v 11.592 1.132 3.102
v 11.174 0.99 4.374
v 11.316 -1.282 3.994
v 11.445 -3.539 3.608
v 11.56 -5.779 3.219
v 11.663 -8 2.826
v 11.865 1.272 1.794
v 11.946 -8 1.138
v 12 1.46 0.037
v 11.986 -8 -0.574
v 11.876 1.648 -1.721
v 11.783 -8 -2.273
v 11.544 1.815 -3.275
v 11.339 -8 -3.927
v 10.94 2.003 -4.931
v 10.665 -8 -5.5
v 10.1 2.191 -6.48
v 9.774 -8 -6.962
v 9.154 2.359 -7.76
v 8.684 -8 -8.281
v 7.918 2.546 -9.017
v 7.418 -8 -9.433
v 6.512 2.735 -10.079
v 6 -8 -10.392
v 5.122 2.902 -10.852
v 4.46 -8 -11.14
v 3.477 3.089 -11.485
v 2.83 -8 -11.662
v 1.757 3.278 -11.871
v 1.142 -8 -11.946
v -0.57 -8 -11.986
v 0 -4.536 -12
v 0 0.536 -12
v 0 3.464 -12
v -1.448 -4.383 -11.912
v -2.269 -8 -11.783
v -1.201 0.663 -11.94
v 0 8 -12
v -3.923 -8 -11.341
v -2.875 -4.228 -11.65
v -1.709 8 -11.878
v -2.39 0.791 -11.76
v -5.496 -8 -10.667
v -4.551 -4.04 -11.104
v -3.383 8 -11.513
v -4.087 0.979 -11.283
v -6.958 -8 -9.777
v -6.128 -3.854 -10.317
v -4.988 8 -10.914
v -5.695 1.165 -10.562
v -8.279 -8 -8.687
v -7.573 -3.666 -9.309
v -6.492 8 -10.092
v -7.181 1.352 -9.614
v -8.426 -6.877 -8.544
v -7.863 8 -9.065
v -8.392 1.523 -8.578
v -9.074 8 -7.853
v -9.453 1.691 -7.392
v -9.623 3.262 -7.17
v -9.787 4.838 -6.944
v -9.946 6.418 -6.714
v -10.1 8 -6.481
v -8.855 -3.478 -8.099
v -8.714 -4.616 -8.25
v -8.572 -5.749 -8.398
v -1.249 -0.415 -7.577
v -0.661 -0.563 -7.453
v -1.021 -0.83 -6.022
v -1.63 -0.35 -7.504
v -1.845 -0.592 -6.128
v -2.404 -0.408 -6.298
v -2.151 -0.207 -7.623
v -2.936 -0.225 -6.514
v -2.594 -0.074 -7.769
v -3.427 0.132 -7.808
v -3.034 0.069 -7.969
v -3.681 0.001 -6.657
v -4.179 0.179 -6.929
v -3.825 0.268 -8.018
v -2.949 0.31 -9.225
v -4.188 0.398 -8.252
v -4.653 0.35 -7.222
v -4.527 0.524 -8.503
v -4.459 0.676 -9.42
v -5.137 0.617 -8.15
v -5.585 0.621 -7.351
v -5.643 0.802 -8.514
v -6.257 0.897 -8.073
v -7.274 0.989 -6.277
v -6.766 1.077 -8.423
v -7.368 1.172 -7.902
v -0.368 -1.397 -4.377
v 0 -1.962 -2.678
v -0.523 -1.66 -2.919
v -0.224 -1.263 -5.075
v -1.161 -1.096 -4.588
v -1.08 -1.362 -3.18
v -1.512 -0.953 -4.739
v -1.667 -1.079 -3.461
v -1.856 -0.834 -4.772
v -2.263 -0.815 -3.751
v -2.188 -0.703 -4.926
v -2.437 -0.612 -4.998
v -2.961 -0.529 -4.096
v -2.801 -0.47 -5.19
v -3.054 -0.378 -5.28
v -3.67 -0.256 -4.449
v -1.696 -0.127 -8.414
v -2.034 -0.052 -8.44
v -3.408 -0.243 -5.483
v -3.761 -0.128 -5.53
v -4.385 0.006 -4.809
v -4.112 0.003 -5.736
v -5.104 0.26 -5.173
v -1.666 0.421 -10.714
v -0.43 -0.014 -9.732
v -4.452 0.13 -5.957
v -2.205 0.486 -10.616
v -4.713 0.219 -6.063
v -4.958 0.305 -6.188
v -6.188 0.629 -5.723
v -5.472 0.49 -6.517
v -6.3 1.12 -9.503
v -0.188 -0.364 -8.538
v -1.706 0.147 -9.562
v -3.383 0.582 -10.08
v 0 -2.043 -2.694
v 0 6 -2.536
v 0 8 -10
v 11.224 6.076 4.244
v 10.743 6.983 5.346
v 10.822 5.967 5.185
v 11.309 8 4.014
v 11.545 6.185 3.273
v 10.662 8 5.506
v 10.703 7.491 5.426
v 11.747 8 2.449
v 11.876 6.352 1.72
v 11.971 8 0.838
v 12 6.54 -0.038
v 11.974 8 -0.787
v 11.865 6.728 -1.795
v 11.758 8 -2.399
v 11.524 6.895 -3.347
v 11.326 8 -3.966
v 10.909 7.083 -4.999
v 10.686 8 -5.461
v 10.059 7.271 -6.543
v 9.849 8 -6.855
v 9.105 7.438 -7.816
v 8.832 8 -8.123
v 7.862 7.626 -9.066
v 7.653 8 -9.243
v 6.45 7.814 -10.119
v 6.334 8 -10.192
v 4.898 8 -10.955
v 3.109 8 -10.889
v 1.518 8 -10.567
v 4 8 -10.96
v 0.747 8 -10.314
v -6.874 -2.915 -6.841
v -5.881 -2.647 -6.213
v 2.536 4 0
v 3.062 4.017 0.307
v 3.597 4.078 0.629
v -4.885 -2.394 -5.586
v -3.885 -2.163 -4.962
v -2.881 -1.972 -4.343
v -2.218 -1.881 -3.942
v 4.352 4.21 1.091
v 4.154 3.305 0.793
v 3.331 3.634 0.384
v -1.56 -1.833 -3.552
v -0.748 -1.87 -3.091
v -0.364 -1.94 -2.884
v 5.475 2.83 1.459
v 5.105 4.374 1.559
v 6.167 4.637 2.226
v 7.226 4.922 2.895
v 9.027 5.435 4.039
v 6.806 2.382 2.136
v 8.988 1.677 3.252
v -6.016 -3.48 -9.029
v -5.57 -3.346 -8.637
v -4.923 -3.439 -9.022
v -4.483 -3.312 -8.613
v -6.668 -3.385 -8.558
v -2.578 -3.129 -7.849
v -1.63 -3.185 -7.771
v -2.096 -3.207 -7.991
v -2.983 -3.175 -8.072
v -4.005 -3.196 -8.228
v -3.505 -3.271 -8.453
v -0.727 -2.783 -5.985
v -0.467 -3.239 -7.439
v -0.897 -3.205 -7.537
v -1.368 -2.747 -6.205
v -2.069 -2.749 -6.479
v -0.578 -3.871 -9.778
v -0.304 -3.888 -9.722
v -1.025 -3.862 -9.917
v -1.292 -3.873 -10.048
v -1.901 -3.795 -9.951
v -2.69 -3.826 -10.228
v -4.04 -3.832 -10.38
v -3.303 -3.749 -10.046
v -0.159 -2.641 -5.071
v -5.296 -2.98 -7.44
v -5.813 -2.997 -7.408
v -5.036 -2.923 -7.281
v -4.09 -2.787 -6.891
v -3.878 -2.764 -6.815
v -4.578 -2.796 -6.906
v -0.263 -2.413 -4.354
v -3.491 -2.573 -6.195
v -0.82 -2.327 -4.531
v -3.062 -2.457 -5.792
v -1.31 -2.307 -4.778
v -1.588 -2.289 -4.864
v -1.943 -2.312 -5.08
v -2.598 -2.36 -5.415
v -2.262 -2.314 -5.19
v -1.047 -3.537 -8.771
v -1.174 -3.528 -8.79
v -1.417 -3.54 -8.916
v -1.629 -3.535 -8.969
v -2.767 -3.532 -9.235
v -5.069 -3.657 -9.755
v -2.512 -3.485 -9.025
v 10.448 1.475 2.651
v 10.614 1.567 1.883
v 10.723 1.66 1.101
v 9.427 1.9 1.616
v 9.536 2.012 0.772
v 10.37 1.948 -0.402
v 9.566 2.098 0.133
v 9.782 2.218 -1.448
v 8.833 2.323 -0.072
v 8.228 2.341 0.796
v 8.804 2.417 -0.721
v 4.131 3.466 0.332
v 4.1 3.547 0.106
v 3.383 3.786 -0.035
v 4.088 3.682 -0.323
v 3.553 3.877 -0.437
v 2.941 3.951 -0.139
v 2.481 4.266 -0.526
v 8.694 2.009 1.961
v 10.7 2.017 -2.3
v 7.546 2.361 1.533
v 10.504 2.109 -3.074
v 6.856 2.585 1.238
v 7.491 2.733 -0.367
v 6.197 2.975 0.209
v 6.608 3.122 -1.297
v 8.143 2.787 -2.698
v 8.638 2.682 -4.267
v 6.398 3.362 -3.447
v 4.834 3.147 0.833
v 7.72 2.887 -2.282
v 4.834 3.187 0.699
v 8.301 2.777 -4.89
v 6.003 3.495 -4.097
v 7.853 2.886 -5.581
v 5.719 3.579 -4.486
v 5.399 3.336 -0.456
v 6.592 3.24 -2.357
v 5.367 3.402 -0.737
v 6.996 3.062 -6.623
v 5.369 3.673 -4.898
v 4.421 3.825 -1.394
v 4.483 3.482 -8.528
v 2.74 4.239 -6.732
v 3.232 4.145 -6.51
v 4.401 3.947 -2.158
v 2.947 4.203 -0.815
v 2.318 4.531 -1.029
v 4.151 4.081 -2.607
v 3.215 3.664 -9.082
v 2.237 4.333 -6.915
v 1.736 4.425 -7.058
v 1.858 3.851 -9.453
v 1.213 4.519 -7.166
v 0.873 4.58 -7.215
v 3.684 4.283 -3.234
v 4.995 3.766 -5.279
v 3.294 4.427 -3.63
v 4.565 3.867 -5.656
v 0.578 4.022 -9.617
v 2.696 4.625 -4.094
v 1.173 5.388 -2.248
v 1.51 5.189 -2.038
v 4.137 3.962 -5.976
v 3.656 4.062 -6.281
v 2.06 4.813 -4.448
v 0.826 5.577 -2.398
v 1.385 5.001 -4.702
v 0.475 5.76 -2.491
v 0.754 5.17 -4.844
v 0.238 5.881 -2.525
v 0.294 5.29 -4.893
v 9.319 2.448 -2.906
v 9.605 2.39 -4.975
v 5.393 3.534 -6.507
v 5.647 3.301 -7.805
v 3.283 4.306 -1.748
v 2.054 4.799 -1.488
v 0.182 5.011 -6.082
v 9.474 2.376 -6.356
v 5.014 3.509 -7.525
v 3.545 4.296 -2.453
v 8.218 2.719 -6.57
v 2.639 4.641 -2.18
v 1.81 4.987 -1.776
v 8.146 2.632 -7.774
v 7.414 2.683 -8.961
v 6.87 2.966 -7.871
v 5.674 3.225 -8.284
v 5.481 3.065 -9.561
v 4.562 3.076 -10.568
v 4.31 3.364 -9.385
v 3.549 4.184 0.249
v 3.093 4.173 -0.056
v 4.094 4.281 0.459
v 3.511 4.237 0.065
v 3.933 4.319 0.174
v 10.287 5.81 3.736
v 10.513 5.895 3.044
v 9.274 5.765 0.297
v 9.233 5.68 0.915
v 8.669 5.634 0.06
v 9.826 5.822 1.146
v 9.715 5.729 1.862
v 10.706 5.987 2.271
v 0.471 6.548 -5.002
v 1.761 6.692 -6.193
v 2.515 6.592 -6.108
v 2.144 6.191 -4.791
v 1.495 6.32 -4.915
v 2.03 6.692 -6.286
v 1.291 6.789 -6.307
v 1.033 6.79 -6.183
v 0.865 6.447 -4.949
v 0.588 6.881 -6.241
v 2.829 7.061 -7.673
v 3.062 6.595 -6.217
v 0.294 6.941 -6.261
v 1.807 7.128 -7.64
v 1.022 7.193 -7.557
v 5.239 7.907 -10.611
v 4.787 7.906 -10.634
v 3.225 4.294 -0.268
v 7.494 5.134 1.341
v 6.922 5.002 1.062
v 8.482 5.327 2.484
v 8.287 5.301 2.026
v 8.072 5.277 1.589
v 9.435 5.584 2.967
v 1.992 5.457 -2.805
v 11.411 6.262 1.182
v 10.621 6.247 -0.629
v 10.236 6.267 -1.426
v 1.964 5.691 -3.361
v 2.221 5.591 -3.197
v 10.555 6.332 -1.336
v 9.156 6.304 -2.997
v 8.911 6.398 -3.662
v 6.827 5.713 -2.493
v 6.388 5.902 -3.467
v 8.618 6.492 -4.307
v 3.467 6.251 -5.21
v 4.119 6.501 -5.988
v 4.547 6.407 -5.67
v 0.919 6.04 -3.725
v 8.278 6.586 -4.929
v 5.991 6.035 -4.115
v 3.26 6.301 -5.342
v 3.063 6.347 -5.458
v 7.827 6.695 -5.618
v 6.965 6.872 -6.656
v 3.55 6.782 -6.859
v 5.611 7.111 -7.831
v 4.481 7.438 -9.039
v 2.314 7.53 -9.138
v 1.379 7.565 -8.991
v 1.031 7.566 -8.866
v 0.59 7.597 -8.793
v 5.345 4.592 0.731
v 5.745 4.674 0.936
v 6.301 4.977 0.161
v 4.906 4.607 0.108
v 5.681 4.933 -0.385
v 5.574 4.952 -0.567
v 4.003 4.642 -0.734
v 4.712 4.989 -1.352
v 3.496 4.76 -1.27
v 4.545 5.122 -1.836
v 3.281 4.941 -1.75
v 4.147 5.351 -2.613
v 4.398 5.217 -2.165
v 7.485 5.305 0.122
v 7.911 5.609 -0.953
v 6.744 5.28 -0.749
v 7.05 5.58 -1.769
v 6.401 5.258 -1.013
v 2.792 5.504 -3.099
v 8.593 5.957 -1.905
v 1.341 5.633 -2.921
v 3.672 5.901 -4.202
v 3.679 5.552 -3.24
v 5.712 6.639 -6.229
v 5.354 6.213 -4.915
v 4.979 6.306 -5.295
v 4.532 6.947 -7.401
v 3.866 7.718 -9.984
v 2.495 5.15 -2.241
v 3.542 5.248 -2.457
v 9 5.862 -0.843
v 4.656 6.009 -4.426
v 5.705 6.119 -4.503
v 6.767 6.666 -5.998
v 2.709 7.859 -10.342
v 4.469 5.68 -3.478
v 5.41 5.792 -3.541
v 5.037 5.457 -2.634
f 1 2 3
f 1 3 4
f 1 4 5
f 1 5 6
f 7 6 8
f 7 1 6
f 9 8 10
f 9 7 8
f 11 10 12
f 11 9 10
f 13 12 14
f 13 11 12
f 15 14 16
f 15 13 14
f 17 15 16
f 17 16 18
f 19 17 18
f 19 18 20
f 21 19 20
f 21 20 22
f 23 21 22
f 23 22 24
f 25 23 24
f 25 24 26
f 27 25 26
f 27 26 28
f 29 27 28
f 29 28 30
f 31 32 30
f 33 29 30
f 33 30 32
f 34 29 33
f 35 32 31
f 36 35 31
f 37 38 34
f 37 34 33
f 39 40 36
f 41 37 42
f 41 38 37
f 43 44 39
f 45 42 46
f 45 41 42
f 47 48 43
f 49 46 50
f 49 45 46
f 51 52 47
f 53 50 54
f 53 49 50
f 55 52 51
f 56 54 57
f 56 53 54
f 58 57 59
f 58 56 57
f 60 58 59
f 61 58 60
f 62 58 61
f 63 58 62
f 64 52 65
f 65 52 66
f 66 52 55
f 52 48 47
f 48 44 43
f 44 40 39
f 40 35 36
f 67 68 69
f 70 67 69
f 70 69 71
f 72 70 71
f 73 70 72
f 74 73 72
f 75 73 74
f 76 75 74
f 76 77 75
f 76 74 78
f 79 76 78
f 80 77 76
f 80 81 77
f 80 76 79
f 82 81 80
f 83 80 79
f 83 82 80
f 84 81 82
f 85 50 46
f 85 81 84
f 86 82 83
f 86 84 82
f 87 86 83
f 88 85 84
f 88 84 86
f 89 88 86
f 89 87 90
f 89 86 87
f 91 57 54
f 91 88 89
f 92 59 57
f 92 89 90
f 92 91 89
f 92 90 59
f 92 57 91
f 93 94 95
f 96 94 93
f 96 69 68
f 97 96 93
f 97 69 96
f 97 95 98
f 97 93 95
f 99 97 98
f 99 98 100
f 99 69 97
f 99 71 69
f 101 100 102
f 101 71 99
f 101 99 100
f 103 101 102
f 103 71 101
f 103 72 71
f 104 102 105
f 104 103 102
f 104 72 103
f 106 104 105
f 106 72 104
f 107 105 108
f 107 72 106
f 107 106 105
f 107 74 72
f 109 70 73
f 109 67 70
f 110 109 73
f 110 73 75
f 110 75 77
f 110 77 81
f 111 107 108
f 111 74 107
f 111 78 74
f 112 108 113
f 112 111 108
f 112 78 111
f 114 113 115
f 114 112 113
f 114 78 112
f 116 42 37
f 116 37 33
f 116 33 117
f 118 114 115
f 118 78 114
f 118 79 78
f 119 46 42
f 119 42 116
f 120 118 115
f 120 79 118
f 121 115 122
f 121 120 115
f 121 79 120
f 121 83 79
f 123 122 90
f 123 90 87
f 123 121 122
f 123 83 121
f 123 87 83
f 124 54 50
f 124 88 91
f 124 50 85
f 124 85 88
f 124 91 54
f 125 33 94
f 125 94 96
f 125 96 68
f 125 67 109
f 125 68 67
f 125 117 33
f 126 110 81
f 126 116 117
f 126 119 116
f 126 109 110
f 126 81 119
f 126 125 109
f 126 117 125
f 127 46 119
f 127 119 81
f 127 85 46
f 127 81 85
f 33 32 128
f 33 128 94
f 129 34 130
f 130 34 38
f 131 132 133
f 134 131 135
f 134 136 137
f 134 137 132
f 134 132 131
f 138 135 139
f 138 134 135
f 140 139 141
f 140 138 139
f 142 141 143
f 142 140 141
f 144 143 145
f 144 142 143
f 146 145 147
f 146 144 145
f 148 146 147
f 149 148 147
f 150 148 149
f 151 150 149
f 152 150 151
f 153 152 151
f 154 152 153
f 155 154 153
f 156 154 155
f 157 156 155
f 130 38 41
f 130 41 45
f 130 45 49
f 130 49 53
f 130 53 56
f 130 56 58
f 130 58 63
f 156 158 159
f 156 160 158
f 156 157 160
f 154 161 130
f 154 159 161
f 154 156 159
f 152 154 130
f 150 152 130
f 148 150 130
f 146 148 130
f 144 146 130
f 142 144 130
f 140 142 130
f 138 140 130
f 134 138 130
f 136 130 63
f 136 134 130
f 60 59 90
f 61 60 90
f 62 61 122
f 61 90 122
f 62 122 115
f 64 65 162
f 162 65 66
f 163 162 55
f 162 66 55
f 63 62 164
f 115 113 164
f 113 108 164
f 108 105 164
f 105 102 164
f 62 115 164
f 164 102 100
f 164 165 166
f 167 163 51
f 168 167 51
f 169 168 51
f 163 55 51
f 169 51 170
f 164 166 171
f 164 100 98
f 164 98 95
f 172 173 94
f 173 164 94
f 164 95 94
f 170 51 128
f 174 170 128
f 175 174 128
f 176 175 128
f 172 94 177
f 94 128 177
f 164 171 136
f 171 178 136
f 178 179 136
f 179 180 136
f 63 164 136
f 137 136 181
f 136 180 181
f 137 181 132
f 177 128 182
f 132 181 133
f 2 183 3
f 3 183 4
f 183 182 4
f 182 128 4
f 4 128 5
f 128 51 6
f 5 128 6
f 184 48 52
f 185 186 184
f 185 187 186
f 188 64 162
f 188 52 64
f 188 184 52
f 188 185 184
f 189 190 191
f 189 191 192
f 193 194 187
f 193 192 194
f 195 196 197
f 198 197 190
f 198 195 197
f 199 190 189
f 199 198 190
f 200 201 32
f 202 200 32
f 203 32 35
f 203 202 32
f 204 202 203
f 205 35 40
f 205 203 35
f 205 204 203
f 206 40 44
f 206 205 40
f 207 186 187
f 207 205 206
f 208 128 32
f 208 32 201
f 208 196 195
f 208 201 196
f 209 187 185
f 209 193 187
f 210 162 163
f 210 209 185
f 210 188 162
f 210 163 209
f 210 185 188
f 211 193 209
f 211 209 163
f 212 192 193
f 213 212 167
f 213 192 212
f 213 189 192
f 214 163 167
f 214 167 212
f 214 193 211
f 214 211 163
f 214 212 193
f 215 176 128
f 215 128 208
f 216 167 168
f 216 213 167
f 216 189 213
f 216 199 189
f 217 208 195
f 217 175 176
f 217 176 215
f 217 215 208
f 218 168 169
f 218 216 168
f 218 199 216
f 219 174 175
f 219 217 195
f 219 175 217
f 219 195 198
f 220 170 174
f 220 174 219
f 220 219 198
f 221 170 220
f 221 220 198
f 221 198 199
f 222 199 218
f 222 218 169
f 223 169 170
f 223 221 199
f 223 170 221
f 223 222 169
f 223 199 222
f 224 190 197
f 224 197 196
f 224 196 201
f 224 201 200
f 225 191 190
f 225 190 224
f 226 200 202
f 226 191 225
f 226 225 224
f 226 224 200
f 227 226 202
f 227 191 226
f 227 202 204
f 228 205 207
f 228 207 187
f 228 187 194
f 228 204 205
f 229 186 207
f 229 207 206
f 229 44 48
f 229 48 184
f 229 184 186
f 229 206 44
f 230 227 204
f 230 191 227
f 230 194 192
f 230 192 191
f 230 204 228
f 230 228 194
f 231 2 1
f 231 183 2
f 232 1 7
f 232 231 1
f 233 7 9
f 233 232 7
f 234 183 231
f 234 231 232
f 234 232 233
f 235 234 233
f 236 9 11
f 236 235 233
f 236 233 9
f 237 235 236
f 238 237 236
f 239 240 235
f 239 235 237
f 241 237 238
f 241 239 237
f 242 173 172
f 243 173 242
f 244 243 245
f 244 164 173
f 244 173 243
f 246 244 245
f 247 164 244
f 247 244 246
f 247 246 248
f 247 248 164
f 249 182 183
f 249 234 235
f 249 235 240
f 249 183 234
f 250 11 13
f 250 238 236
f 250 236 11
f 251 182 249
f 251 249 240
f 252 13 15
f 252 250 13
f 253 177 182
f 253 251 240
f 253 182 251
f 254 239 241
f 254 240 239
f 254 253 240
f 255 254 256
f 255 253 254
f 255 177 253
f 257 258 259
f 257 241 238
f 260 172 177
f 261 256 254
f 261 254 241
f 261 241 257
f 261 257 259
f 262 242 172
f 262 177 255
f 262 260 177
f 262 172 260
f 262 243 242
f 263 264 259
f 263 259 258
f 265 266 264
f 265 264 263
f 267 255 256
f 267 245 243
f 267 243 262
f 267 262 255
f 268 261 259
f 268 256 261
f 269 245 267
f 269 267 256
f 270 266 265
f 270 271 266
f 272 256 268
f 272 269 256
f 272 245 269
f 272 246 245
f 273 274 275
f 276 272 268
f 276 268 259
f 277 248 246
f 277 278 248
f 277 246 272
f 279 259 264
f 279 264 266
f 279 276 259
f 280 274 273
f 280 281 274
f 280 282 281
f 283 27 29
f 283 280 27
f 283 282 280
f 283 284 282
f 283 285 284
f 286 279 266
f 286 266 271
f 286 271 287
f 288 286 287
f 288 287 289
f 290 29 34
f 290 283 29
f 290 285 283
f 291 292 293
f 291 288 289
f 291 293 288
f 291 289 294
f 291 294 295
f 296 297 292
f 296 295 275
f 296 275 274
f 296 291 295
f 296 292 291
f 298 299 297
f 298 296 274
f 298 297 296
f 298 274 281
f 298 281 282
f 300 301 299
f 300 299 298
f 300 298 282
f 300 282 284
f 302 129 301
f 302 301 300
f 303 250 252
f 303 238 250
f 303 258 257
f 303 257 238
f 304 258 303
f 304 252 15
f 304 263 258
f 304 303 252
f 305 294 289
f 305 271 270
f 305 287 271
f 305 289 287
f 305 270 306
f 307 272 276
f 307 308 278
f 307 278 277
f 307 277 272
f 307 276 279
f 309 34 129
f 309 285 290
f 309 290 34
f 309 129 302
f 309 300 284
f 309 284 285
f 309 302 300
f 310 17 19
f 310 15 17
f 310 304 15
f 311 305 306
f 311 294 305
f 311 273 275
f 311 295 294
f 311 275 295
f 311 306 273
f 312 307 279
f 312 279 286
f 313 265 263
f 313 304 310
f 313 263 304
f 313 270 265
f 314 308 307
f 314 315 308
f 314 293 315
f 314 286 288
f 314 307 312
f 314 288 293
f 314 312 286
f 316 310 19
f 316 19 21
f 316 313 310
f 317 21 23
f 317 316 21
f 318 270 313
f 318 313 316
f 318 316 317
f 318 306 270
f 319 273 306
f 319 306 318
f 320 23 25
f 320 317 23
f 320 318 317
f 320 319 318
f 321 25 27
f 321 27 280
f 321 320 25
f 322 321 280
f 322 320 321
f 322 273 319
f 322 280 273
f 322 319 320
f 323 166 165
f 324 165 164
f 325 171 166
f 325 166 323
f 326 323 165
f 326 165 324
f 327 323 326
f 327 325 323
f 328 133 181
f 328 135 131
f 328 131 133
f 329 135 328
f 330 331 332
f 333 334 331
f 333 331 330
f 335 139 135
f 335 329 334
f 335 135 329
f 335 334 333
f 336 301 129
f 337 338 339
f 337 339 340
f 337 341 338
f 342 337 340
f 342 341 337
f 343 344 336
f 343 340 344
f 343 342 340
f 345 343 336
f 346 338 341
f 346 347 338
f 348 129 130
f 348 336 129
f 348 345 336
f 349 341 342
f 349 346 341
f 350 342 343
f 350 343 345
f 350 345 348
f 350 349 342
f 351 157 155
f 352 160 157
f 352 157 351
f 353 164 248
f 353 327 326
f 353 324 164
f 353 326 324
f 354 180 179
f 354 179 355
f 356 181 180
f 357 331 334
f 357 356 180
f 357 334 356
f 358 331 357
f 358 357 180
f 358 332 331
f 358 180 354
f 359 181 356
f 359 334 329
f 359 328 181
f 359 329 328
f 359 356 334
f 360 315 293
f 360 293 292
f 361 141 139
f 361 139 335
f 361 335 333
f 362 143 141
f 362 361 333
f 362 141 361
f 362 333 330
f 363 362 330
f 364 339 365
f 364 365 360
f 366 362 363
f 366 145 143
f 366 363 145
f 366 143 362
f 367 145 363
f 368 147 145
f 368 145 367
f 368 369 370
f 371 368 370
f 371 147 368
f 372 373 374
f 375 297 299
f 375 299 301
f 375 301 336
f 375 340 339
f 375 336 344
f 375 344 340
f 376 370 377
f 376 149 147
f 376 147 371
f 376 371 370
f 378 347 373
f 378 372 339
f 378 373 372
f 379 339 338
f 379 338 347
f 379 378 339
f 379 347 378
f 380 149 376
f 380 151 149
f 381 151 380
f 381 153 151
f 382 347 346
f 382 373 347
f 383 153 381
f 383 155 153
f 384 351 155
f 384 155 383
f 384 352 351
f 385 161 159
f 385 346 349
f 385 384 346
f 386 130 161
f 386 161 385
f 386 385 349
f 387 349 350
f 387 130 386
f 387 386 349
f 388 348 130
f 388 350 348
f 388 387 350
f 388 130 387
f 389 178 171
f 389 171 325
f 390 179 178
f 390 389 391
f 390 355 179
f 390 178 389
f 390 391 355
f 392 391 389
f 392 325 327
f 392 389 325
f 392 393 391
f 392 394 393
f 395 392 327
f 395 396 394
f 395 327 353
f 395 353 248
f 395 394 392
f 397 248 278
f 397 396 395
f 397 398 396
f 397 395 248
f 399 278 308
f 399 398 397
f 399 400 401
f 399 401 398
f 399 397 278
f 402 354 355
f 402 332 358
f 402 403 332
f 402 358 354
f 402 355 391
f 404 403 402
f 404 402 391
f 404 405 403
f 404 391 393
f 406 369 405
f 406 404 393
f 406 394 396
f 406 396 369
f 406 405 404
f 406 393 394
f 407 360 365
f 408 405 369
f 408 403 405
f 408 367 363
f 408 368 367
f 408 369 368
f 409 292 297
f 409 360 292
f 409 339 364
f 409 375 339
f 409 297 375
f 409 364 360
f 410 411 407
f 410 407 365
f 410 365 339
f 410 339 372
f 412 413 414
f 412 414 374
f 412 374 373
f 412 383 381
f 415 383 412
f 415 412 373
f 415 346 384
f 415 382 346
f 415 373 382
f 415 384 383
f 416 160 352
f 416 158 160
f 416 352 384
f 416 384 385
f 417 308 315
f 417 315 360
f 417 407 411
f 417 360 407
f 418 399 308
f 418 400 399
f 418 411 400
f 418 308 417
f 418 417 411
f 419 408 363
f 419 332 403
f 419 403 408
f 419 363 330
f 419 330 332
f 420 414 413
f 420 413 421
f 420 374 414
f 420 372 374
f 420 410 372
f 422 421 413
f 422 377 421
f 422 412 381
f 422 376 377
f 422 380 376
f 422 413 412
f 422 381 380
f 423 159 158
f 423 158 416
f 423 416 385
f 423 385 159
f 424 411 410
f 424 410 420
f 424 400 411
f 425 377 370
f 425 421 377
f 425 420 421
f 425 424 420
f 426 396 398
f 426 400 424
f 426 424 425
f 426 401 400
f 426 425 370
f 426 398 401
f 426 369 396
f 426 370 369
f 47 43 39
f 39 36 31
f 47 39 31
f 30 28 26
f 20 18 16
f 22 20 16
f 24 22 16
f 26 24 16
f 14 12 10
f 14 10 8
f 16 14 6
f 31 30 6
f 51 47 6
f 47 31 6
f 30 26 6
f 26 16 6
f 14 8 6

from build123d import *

# Parameters (mm, degrees)
SKETCH_2_R              = 12
EXTRUDE_1_DEPTH         = 8
SWEEP_3_PITCH           = 8
SURFACE_START           = -14
SURFACE_CUT_2_OUTLINE_W = 28
SURFACE_CUT_2_OUTLINE_H = 22
SURFACE_CUT_2_DEPTH     = 15.943319485


with BuildPart() as part:
    # Эскиз2 → Бобышка-Вытянуть1 (new, symmetric)
    with BuildSketch(Plane(origin=(0, 0, 0), x_dir=(1, 0, 0), z_dir=(0, 1, 0))):
        with Locations(Location((0, 0, 0), (0, 0, 270))):
            Circle(SKETCH_2_R)
    extrude(amount=EXTRUDE_1_DEPTH, both=True)

    # Вырез-По траектории3: arcs per turn and ends read off the stored shape
    # Вырез-По траектории3: the profile of Эскиз5<2> screwed along a right-hand helix through 1 turns, 14 arcs to a turn; built about Z, then put on its axis
    sweep_3_z = Axis((0, 0, 0), (0, 0, 1))
    sweep_3_corners = [(17.464, 0, 2), (2.536, 0, 5.999945545), (17.464, 0, 9.999891089)]
    with BuildLine(mode=Mode.PRIVATE) as sweep_3_profile:
        Line(sweep_3_corners[0], sweep_3_corners[1])
        Line(sweep_3_corners[1], sweep_3_corners[2])
        Line(sweep_3_corners[2], sweep_3_corners[0])
    sweep_3_cap = Face(sweep_3_profile.wire())
    sweep_3_turn_angles = [0, 12.857142857, 25.714285714, 38.571428571, 51.428571429, 64.285714286, 77.142857143, 90, 102.857142857, 115.714285714, 128.571428571, 141.428571429, 154.285714286, 167.142857143, 180, 192.857142857, 205.714285714, 218.571428571, 231.428571429, 244.285714286, 257.142857143, 270, 282.857142857, 295.714285714, 308.571428571, 321.428571429, 334.285714286, 347.142857143, 360]
    sweep_3_turn_weights = [1, 0.9749279121818236, 1, 0.9749279121818236, 1, 0.9749279121818236, 1, 0.9749279121818236, 1, 0.9749279121818236, 1, 0.9749279121818236, 1, 0.9749279121818236, 1, 0.9749279121818236, 1, 0.9749279121818236, 1, 0.9749279121818236, 1, 0.9749279121818236, 1, 0.9749279121818237, 1, 0.9749279121818236, 1, 0.9749279121818236, 1]
    sweep_3_turn_rails = [Edge.make_bspline([Vector(p[0], p[1], 0).rotate(sweep_3_z, sweep_3_turn_angles[k]) / sweep_3_turn_weights[k] + Vector(0, 0, p[2] + SWEEP_3_PITCH * sweep_3_turn_angles[k] / 360) for k in range(29)], [0, 0, 0, 1, 1, 2, 2, 3, 3, 4, 4, 5, 5, 6, 6, 7, 7, 8, 8, 9, 9, 10, 10, 11, 11, 12, 12, 13, 13, 14, 14, 14], 2, sweep_3_turn_weights) for p in sweep_3_corners]
    sweep_3_turn_sides = [Face.make_surface_from_curves(sweep_3_turn_rails[p[0]], sweep_3_turn_rails[p[1]]) for p in [(0, 1), (1, 2), (2, 0)]]
    sweep_3 = Plane(origin=(0, -8, 0), x_dir=(0, 0, -1), z_dir=(0, 1, 0)) * Solid(Shell([*sweep_3_turn_sides, sweep_3_cap, sweep_3_cap.rotate(sweep_3_z, 360).moved(Location((0, 0, SWEEP_3_PITCH * 360 / 360)))]))
    add(sweep_3, mode=Mode.SUBTRACT)

    # Surface Cut 2: read off the stored shape, not the designer's step
    # Surface Cut 2 outline → Surface Cut 2 (cut)
    with BuildSketch(Plane(origin=(0, 0, 0), x_dir=(0.8703668320896428, -0.09824022777399519, 0.48250433702211726), z_dir=(0.4924038765061049, 0.17364817766692997, -0.8528685319524428)).offset(SURFACE_START)):
        Rectangle(SURFACE_CUT_2_OUTLINE_W, SURFACE_CUT_2_OUTLINE_H)
    extrude(amount=SURFACE_CUT_2_DEPTH, mode=Mode.SUBTRACT)


solid = part.part
